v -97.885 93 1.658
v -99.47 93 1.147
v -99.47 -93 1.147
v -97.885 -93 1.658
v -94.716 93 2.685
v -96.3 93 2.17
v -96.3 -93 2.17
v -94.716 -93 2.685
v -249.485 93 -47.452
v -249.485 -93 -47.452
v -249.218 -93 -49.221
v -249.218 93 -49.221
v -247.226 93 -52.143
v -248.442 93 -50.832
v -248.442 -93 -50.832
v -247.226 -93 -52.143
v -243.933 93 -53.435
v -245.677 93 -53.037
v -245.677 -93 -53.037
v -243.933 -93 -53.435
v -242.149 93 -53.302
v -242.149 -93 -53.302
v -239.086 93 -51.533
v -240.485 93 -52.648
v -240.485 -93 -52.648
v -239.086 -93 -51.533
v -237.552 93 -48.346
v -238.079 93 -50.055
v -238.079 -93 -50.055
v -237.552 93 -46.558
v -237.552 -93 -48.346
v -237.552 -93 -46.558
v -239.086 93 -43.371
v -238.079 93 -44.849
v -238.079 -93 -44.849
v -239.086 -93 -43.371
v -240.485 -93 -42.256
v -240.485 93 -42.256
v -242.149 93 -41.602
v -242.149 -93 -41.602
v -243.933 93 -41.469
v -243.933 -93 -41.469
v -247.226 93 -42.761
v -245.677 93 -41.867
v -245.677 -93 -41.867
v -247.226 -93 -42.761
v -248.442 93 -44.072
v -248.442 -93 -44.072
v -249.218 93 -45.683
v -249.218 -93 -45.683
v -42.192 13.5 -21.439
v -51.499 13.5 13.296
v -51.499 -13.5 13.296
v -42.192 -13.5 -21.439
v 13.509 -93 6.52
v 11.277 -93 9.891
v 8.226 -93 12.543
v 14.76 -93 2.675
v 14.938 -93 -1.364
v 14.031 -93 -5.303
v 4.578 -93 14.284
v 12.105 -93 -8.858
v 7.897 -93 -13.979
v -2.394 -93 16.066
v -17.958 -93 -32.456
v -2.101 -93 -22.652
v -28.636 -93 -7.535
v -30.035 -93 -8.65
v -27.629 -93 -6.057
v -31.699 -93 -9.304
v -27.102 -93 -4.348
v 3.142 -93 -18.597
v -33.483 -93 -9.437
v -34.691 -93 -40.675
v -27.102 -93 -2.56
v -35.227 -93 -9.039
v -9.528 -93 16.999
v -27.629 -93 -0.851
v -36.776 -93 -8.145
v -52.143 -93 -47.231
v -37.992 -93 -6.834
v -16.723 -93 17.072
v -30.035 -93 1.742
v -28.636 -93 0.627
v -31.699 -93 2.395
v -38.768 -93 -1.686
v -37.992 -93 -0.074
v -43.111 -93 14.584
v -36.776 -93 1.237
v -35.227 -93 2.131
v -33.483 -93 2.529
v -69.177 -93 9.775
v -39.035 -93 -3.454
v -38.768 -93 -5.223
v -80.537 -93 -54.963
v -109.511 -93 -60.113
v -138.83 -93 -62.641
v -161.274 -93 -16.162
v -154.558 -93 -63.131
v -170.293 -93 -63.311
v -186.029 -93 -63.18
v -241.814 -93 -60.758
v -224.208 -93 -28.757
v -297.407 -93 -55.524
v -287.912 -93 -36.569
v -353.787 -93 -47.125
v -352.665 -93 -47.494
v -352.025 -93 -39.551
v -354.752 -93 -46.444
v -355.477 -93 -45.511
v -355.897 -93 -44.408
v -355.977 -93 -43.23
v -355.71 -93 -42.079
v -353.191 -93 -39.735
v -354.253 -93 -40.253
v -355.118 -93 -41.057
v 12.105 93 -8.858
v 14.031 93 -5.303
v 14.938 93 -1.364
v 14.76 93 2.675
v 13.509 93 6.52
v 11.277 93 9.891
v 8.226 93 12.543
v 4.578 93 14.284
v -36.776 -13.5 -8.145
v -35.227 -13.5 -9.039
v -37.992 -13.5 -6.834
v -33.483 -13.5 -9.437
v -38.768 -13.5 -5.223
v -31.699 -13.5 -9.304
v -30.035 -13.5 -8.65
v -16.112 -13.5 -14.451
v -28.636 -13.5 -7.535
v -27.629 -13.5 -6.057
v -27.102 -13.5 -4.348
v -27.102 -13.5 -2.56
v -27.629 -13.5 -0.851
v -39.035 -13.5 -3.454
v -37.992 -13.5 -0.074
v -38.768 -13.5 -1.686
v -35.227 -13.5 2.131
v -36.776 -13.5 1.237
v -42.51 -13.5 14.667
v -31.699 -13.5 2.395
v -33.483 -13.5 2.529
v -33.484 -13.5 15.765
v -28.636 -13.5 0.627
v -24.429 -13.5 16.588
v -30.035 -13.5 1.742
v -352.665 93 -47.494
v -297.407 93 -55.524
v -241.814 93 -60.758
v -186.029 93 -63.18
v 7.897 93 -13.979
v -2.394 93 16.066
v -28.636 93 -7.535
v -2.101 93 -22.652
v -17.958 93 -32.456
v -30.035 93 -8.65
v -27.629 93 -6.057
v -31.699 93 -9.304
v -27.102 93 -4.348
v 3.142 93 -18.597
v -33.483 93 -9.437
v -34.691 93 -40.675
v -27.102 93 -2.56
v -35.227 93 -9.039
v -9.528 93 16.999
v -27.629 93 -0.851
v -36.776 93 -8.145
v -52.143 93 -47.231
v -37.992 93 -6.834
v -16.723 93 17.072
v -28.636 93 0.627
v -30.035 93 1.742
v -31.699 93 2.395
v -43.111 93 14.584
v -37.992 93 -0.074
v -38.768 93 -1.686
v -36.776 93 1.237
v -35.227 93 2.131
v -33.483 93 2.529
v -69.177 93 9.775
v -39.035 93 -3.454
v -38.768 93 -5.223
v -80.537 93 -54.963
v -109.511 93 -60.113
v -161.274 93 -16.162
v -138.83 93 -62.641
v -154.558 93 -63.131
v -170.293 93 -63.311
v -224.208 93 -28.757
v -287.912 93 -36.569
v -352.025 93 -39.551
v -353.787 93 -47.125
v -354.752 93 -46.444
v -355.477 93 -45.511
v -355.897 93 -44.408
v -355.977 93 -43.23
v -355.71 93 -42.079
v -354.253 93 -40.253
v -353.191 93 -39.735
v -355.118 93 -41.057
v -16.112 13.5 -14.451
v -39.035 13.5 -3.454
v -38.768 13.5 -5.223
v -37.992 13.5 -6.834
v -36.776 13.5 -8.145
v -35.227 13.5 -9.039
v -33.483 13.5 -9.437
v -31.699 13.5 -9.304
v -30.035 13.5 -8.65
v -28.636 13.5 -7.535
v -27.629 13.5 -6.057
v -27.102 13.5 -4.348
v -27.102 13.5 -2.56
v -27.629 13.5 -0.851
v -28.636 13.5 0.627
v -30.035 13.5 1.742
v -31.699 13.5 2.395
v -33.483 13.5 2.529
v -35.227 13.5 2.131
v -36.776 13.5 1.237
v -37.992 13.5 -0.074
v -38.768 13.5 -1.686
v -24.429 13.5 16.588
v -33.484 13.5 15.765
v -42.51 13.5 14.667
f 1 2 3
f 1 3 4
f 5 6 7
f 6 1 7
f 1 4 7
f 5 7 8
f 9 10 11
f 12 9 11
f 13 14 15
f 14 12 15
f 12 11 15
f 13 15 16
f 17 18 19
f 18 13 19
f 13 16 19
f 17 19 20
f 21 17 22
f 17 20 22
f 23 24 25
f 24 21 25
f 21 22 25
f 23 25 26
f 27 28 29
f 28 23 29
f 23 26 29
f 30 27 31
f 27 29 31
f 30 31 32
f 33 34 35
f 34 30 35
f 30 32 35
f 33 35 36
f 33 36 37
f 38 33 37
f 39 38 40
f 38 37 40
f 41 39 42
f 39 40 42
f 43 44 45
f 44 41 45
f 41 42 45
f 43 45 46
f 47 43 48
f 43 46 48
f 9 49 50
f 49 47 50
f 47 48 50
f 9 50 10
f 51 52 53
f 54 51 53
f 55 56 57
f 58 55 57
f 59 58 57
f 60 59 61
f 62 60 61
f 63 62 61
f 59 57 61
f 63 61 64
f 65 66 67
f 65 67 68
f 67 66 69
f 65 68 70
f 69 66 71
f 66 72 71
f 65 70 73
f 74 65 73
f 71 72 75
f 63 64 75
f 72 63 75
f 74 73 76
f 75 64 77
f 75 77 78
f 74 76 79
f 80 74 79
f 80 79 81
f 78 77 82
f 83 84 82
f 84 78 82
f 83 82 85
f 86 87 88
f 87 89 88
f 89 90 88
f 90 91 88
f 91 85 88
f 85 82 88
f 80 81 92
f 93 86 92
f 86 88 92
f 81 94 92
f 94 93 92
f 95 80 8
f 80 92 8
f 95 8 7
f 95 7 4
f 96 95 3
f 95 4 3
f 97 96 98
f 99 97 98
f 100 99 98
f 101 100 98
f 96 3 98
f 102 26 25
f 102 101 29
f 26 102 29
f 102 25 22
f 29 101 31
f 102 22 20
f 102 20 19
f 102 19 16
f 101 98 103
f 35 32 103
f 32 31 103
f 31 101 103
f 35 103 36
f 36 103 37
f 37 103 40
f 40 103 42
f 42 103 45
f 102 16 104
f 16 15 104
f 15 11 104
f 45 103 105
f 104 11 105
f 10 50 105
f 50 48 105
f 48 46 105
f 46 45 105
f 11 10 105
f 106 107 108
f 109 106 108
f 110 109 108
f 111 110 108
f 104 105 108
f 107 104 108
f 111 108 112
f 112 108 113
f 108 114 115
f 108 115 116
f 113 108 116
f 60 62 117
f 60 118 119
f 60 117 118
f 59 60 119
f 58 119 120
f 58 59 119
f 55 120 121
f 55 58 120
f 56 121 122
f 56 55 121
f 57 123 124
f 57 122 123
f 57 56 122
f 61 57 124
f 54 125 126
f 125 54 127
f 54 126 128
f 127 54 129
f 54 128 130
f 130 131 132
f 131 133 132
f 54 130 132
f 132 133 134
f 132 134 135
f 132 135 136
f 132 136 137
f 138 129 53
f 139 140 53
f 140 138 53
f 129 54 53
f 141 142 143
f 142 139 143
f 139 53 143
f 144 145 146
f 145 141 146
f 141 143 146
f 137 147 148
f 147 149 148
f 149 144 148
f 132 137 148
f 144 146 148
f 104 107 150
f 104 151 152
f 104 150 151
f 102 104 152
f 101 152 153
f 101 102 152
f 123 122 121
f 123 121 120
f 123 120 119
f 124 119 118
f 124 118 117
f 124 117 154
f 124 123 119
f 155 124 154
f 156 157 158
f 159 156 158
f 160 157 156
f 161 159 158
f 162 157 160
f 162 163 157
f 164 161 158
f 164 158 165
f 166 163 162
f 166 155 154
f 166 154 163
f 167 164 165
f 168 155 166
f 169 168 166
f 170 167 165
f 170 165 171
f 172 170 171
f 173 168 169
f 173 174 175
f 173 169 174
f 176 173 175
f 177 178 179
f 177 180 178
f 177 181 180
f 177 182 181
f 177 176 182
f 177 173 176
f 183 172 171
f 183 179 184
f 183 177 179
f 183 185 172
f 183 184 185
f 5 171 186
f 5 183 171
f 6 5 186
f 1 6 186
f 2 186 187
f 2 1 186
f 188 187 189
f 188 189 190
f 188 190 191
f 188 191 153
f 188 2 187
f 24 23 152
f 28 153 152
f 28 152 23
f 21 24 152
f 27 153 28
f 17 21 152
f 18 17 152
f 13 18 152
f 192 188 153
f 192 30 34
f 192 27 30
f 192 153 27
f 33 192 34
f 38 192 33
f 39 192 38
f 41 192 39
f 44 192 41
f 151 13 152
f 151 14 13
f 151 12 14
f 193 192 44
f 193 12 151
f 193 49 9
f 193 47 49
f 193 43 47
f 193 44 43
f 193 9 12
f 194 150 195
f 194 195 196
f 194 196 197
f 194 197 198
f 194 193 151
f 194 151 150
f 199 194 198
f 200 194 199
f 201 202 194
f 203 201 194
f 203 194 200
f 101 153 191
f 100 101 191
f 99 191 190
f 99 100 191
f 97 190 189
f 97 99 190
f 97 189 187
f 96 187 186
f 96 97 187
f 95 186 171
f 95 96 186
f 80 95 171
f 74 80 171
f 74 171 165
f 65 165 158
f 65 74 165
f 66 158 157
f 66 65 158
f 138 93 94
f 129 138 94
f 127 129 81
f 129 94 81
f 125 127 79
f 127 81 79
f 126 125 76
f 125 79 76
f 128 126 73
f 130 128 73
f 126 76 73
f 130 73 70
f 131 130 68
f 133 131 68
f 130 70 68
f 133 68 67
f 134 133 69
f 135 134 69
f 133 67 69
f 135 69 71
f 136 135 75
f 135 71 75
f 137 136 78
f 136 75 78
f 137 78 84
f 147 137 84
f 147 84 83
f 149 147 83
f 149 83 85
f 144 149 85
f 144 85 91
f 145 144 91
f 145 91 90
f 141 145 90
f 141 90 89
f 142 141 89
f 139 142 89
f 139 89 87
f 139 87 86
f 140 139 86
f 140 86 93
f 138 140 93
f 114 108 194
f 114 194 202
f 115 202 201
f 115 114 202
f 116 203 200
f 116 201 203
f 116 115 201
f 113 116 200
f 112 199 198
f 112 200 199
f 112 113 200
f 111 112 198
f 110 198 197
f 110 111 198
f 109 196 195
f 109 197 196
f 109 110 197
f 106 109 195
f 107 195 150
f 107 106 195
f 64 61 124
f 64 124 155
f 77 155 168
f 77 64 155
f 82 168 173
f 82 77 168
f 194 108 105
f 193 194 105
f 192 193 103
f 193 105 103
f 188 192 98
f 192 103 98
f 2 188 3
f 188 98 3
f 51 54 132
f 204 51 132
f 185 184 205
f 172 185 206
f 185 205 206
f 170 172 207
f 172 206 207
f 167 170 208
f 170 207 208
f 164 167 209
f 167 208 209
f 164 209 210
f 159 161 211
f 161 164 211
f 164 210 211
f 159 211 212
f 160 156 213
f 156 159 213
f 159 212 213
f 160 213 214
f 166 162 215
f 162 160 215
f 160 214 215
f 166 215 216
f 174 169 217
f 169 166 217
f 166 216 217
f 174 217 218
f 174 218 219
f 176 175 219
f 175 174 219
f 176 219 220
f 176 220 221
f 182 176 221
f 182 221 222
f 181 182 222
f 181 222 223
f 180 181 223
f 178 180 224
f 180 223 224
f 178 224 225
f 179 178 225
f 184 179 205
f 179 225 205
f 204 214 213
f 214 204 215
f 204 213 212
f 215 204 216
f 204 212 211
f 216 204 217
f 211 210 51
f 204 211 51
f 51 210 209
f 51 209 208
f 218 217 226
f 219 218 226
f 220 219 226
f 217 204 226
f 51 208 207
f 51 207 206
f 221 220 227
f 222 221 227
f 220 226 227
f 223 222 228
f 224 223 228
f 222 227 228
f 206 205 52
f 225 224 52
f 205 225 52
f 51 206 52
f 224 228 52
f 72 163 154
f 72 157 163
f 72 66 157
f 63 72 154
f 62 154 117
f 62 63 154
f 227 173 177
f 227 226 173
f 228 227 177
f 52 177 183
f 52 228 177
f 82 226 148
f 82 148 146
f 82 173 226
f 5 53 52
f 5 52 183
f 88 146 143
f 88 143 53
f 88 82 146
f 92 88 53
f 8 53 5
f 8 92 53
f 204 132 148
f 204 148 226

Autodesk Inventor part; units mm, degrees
ref_plane "YZ Plane" through (0, 0, 0) normal (1, 0, 0) x (0, 1, 0)
ref_plane "XZ Plane" through (0, 0, 0) normal (0, 1, 0) x (-1, 0, 0)
ref_plane "XY Plane" through (0, 0, 0) normal (0, 0, 1) x (1, 0, 0)
sketch "スケッチ2" plane through (0, 0, 0) normal (0, 1, 0) x (-1, 0, 0)
  arc A0 (186.0286, -63.1802) -> (352.6649, -47.4935) centre (165.9229, 1043.3137) ccw projected
  arc A1 (138.8299, -62.6406) -> (186.0286, -63.1802) centre (171.5405, 734.1521) ccw projected
  arc A2 (52.1426, -47.2314) -> (138.8299, -62.6406) centre (152.2575, 264.4411) ccw projected
  arc A3 (2.1008, -22.6524) -> (52.1426, -47.2314) centre (110.8425, 135.5101) ccw projected
  arc A4 (-12.1054, -8.8578) -> (2.1008, -22.6524) centre (35.5695, 26.0271) ccw projected
  arc A5 (-4.5779, 14.2844) -> (-12.1054, -8.8578) centre (0, 0) ccw projected
  arc A6 (16.7232, 17.0724) -> (-4.5779, 14.2844) centre (13.7336, -42.8531) ccw projected
  arc A7 (94.7165, 2.6851) -> (16.7232, 17.0724) centre (1.7751, -282.555) ccw projected
  arc A8 (94.7165, 2.6851) -> (99.4705, 1.147) centre (466.4821, 1143.6454) ccw projected
  arc A9 (99.4705, 1.147) -> (352.0248, -39.551) centre (359.437, 810.4167) ccw projected
  arc A10 (352.6649, -47.4935) -> (352.0248, -39.551) centre (351.99, -43.5508) ccw projected
  circle A11 centre (33.0346, -3.4541) radius 6 projected
  circle A12 centre (243.4846, -47.452) radius 6 projected
  point P0 (0, 0)
extrude "押し出し2" add sketch "スケッチ2" along normal mid plane 186
ref_plane "作業平面1" through (-49.9941, -10.2, 38.589) normal (-0.2588, 0, 0.9659) x (0.9659, 0, 0.2588)
sketch "スケッチ3" plane through (-49.9941, -10.2, 38.589) normal (-0.2588, 0, 0.9659) x (0.9659, 0, 0.2588)
  line L0 (18, 13.4) -> (18, 7) projected
  line L1 (0, -2.3) -> (11, -2.3) projected
  line L2 (-7, 7) -> (-7, 13.4) projected
  line L3 (11, 22.7) -> (0, 22.7) projected
  line L4 (18, -2.3) -> (-7, -2.3)
  line L5 (-7, -2.3) -> (-7, 22.7)
  line L6 (-7, 22.7) -> (18, 22.7)
  line L7 (18, 22.7) -> (18, -2.3)
  line L8 (-8, -3.3) -> (19, -3.3)
  line L9 (19, -3.3) -> (19, 23.7)
  line L10 (19, 23.7) -> (-8, 23.7)
  line L11 (-8, 23.7) -> (-8, -3.3)
  point P0 (38.303, 10.2)
  dimension "d6" = 1
extrude "押し出し3" cut sketch "スケッチ3" against normal blind 60 contours L0 L7 L4 L1 L5 L2 L6 L3 | L11 L10 L9 L8
properties part number "mainflap for center"
